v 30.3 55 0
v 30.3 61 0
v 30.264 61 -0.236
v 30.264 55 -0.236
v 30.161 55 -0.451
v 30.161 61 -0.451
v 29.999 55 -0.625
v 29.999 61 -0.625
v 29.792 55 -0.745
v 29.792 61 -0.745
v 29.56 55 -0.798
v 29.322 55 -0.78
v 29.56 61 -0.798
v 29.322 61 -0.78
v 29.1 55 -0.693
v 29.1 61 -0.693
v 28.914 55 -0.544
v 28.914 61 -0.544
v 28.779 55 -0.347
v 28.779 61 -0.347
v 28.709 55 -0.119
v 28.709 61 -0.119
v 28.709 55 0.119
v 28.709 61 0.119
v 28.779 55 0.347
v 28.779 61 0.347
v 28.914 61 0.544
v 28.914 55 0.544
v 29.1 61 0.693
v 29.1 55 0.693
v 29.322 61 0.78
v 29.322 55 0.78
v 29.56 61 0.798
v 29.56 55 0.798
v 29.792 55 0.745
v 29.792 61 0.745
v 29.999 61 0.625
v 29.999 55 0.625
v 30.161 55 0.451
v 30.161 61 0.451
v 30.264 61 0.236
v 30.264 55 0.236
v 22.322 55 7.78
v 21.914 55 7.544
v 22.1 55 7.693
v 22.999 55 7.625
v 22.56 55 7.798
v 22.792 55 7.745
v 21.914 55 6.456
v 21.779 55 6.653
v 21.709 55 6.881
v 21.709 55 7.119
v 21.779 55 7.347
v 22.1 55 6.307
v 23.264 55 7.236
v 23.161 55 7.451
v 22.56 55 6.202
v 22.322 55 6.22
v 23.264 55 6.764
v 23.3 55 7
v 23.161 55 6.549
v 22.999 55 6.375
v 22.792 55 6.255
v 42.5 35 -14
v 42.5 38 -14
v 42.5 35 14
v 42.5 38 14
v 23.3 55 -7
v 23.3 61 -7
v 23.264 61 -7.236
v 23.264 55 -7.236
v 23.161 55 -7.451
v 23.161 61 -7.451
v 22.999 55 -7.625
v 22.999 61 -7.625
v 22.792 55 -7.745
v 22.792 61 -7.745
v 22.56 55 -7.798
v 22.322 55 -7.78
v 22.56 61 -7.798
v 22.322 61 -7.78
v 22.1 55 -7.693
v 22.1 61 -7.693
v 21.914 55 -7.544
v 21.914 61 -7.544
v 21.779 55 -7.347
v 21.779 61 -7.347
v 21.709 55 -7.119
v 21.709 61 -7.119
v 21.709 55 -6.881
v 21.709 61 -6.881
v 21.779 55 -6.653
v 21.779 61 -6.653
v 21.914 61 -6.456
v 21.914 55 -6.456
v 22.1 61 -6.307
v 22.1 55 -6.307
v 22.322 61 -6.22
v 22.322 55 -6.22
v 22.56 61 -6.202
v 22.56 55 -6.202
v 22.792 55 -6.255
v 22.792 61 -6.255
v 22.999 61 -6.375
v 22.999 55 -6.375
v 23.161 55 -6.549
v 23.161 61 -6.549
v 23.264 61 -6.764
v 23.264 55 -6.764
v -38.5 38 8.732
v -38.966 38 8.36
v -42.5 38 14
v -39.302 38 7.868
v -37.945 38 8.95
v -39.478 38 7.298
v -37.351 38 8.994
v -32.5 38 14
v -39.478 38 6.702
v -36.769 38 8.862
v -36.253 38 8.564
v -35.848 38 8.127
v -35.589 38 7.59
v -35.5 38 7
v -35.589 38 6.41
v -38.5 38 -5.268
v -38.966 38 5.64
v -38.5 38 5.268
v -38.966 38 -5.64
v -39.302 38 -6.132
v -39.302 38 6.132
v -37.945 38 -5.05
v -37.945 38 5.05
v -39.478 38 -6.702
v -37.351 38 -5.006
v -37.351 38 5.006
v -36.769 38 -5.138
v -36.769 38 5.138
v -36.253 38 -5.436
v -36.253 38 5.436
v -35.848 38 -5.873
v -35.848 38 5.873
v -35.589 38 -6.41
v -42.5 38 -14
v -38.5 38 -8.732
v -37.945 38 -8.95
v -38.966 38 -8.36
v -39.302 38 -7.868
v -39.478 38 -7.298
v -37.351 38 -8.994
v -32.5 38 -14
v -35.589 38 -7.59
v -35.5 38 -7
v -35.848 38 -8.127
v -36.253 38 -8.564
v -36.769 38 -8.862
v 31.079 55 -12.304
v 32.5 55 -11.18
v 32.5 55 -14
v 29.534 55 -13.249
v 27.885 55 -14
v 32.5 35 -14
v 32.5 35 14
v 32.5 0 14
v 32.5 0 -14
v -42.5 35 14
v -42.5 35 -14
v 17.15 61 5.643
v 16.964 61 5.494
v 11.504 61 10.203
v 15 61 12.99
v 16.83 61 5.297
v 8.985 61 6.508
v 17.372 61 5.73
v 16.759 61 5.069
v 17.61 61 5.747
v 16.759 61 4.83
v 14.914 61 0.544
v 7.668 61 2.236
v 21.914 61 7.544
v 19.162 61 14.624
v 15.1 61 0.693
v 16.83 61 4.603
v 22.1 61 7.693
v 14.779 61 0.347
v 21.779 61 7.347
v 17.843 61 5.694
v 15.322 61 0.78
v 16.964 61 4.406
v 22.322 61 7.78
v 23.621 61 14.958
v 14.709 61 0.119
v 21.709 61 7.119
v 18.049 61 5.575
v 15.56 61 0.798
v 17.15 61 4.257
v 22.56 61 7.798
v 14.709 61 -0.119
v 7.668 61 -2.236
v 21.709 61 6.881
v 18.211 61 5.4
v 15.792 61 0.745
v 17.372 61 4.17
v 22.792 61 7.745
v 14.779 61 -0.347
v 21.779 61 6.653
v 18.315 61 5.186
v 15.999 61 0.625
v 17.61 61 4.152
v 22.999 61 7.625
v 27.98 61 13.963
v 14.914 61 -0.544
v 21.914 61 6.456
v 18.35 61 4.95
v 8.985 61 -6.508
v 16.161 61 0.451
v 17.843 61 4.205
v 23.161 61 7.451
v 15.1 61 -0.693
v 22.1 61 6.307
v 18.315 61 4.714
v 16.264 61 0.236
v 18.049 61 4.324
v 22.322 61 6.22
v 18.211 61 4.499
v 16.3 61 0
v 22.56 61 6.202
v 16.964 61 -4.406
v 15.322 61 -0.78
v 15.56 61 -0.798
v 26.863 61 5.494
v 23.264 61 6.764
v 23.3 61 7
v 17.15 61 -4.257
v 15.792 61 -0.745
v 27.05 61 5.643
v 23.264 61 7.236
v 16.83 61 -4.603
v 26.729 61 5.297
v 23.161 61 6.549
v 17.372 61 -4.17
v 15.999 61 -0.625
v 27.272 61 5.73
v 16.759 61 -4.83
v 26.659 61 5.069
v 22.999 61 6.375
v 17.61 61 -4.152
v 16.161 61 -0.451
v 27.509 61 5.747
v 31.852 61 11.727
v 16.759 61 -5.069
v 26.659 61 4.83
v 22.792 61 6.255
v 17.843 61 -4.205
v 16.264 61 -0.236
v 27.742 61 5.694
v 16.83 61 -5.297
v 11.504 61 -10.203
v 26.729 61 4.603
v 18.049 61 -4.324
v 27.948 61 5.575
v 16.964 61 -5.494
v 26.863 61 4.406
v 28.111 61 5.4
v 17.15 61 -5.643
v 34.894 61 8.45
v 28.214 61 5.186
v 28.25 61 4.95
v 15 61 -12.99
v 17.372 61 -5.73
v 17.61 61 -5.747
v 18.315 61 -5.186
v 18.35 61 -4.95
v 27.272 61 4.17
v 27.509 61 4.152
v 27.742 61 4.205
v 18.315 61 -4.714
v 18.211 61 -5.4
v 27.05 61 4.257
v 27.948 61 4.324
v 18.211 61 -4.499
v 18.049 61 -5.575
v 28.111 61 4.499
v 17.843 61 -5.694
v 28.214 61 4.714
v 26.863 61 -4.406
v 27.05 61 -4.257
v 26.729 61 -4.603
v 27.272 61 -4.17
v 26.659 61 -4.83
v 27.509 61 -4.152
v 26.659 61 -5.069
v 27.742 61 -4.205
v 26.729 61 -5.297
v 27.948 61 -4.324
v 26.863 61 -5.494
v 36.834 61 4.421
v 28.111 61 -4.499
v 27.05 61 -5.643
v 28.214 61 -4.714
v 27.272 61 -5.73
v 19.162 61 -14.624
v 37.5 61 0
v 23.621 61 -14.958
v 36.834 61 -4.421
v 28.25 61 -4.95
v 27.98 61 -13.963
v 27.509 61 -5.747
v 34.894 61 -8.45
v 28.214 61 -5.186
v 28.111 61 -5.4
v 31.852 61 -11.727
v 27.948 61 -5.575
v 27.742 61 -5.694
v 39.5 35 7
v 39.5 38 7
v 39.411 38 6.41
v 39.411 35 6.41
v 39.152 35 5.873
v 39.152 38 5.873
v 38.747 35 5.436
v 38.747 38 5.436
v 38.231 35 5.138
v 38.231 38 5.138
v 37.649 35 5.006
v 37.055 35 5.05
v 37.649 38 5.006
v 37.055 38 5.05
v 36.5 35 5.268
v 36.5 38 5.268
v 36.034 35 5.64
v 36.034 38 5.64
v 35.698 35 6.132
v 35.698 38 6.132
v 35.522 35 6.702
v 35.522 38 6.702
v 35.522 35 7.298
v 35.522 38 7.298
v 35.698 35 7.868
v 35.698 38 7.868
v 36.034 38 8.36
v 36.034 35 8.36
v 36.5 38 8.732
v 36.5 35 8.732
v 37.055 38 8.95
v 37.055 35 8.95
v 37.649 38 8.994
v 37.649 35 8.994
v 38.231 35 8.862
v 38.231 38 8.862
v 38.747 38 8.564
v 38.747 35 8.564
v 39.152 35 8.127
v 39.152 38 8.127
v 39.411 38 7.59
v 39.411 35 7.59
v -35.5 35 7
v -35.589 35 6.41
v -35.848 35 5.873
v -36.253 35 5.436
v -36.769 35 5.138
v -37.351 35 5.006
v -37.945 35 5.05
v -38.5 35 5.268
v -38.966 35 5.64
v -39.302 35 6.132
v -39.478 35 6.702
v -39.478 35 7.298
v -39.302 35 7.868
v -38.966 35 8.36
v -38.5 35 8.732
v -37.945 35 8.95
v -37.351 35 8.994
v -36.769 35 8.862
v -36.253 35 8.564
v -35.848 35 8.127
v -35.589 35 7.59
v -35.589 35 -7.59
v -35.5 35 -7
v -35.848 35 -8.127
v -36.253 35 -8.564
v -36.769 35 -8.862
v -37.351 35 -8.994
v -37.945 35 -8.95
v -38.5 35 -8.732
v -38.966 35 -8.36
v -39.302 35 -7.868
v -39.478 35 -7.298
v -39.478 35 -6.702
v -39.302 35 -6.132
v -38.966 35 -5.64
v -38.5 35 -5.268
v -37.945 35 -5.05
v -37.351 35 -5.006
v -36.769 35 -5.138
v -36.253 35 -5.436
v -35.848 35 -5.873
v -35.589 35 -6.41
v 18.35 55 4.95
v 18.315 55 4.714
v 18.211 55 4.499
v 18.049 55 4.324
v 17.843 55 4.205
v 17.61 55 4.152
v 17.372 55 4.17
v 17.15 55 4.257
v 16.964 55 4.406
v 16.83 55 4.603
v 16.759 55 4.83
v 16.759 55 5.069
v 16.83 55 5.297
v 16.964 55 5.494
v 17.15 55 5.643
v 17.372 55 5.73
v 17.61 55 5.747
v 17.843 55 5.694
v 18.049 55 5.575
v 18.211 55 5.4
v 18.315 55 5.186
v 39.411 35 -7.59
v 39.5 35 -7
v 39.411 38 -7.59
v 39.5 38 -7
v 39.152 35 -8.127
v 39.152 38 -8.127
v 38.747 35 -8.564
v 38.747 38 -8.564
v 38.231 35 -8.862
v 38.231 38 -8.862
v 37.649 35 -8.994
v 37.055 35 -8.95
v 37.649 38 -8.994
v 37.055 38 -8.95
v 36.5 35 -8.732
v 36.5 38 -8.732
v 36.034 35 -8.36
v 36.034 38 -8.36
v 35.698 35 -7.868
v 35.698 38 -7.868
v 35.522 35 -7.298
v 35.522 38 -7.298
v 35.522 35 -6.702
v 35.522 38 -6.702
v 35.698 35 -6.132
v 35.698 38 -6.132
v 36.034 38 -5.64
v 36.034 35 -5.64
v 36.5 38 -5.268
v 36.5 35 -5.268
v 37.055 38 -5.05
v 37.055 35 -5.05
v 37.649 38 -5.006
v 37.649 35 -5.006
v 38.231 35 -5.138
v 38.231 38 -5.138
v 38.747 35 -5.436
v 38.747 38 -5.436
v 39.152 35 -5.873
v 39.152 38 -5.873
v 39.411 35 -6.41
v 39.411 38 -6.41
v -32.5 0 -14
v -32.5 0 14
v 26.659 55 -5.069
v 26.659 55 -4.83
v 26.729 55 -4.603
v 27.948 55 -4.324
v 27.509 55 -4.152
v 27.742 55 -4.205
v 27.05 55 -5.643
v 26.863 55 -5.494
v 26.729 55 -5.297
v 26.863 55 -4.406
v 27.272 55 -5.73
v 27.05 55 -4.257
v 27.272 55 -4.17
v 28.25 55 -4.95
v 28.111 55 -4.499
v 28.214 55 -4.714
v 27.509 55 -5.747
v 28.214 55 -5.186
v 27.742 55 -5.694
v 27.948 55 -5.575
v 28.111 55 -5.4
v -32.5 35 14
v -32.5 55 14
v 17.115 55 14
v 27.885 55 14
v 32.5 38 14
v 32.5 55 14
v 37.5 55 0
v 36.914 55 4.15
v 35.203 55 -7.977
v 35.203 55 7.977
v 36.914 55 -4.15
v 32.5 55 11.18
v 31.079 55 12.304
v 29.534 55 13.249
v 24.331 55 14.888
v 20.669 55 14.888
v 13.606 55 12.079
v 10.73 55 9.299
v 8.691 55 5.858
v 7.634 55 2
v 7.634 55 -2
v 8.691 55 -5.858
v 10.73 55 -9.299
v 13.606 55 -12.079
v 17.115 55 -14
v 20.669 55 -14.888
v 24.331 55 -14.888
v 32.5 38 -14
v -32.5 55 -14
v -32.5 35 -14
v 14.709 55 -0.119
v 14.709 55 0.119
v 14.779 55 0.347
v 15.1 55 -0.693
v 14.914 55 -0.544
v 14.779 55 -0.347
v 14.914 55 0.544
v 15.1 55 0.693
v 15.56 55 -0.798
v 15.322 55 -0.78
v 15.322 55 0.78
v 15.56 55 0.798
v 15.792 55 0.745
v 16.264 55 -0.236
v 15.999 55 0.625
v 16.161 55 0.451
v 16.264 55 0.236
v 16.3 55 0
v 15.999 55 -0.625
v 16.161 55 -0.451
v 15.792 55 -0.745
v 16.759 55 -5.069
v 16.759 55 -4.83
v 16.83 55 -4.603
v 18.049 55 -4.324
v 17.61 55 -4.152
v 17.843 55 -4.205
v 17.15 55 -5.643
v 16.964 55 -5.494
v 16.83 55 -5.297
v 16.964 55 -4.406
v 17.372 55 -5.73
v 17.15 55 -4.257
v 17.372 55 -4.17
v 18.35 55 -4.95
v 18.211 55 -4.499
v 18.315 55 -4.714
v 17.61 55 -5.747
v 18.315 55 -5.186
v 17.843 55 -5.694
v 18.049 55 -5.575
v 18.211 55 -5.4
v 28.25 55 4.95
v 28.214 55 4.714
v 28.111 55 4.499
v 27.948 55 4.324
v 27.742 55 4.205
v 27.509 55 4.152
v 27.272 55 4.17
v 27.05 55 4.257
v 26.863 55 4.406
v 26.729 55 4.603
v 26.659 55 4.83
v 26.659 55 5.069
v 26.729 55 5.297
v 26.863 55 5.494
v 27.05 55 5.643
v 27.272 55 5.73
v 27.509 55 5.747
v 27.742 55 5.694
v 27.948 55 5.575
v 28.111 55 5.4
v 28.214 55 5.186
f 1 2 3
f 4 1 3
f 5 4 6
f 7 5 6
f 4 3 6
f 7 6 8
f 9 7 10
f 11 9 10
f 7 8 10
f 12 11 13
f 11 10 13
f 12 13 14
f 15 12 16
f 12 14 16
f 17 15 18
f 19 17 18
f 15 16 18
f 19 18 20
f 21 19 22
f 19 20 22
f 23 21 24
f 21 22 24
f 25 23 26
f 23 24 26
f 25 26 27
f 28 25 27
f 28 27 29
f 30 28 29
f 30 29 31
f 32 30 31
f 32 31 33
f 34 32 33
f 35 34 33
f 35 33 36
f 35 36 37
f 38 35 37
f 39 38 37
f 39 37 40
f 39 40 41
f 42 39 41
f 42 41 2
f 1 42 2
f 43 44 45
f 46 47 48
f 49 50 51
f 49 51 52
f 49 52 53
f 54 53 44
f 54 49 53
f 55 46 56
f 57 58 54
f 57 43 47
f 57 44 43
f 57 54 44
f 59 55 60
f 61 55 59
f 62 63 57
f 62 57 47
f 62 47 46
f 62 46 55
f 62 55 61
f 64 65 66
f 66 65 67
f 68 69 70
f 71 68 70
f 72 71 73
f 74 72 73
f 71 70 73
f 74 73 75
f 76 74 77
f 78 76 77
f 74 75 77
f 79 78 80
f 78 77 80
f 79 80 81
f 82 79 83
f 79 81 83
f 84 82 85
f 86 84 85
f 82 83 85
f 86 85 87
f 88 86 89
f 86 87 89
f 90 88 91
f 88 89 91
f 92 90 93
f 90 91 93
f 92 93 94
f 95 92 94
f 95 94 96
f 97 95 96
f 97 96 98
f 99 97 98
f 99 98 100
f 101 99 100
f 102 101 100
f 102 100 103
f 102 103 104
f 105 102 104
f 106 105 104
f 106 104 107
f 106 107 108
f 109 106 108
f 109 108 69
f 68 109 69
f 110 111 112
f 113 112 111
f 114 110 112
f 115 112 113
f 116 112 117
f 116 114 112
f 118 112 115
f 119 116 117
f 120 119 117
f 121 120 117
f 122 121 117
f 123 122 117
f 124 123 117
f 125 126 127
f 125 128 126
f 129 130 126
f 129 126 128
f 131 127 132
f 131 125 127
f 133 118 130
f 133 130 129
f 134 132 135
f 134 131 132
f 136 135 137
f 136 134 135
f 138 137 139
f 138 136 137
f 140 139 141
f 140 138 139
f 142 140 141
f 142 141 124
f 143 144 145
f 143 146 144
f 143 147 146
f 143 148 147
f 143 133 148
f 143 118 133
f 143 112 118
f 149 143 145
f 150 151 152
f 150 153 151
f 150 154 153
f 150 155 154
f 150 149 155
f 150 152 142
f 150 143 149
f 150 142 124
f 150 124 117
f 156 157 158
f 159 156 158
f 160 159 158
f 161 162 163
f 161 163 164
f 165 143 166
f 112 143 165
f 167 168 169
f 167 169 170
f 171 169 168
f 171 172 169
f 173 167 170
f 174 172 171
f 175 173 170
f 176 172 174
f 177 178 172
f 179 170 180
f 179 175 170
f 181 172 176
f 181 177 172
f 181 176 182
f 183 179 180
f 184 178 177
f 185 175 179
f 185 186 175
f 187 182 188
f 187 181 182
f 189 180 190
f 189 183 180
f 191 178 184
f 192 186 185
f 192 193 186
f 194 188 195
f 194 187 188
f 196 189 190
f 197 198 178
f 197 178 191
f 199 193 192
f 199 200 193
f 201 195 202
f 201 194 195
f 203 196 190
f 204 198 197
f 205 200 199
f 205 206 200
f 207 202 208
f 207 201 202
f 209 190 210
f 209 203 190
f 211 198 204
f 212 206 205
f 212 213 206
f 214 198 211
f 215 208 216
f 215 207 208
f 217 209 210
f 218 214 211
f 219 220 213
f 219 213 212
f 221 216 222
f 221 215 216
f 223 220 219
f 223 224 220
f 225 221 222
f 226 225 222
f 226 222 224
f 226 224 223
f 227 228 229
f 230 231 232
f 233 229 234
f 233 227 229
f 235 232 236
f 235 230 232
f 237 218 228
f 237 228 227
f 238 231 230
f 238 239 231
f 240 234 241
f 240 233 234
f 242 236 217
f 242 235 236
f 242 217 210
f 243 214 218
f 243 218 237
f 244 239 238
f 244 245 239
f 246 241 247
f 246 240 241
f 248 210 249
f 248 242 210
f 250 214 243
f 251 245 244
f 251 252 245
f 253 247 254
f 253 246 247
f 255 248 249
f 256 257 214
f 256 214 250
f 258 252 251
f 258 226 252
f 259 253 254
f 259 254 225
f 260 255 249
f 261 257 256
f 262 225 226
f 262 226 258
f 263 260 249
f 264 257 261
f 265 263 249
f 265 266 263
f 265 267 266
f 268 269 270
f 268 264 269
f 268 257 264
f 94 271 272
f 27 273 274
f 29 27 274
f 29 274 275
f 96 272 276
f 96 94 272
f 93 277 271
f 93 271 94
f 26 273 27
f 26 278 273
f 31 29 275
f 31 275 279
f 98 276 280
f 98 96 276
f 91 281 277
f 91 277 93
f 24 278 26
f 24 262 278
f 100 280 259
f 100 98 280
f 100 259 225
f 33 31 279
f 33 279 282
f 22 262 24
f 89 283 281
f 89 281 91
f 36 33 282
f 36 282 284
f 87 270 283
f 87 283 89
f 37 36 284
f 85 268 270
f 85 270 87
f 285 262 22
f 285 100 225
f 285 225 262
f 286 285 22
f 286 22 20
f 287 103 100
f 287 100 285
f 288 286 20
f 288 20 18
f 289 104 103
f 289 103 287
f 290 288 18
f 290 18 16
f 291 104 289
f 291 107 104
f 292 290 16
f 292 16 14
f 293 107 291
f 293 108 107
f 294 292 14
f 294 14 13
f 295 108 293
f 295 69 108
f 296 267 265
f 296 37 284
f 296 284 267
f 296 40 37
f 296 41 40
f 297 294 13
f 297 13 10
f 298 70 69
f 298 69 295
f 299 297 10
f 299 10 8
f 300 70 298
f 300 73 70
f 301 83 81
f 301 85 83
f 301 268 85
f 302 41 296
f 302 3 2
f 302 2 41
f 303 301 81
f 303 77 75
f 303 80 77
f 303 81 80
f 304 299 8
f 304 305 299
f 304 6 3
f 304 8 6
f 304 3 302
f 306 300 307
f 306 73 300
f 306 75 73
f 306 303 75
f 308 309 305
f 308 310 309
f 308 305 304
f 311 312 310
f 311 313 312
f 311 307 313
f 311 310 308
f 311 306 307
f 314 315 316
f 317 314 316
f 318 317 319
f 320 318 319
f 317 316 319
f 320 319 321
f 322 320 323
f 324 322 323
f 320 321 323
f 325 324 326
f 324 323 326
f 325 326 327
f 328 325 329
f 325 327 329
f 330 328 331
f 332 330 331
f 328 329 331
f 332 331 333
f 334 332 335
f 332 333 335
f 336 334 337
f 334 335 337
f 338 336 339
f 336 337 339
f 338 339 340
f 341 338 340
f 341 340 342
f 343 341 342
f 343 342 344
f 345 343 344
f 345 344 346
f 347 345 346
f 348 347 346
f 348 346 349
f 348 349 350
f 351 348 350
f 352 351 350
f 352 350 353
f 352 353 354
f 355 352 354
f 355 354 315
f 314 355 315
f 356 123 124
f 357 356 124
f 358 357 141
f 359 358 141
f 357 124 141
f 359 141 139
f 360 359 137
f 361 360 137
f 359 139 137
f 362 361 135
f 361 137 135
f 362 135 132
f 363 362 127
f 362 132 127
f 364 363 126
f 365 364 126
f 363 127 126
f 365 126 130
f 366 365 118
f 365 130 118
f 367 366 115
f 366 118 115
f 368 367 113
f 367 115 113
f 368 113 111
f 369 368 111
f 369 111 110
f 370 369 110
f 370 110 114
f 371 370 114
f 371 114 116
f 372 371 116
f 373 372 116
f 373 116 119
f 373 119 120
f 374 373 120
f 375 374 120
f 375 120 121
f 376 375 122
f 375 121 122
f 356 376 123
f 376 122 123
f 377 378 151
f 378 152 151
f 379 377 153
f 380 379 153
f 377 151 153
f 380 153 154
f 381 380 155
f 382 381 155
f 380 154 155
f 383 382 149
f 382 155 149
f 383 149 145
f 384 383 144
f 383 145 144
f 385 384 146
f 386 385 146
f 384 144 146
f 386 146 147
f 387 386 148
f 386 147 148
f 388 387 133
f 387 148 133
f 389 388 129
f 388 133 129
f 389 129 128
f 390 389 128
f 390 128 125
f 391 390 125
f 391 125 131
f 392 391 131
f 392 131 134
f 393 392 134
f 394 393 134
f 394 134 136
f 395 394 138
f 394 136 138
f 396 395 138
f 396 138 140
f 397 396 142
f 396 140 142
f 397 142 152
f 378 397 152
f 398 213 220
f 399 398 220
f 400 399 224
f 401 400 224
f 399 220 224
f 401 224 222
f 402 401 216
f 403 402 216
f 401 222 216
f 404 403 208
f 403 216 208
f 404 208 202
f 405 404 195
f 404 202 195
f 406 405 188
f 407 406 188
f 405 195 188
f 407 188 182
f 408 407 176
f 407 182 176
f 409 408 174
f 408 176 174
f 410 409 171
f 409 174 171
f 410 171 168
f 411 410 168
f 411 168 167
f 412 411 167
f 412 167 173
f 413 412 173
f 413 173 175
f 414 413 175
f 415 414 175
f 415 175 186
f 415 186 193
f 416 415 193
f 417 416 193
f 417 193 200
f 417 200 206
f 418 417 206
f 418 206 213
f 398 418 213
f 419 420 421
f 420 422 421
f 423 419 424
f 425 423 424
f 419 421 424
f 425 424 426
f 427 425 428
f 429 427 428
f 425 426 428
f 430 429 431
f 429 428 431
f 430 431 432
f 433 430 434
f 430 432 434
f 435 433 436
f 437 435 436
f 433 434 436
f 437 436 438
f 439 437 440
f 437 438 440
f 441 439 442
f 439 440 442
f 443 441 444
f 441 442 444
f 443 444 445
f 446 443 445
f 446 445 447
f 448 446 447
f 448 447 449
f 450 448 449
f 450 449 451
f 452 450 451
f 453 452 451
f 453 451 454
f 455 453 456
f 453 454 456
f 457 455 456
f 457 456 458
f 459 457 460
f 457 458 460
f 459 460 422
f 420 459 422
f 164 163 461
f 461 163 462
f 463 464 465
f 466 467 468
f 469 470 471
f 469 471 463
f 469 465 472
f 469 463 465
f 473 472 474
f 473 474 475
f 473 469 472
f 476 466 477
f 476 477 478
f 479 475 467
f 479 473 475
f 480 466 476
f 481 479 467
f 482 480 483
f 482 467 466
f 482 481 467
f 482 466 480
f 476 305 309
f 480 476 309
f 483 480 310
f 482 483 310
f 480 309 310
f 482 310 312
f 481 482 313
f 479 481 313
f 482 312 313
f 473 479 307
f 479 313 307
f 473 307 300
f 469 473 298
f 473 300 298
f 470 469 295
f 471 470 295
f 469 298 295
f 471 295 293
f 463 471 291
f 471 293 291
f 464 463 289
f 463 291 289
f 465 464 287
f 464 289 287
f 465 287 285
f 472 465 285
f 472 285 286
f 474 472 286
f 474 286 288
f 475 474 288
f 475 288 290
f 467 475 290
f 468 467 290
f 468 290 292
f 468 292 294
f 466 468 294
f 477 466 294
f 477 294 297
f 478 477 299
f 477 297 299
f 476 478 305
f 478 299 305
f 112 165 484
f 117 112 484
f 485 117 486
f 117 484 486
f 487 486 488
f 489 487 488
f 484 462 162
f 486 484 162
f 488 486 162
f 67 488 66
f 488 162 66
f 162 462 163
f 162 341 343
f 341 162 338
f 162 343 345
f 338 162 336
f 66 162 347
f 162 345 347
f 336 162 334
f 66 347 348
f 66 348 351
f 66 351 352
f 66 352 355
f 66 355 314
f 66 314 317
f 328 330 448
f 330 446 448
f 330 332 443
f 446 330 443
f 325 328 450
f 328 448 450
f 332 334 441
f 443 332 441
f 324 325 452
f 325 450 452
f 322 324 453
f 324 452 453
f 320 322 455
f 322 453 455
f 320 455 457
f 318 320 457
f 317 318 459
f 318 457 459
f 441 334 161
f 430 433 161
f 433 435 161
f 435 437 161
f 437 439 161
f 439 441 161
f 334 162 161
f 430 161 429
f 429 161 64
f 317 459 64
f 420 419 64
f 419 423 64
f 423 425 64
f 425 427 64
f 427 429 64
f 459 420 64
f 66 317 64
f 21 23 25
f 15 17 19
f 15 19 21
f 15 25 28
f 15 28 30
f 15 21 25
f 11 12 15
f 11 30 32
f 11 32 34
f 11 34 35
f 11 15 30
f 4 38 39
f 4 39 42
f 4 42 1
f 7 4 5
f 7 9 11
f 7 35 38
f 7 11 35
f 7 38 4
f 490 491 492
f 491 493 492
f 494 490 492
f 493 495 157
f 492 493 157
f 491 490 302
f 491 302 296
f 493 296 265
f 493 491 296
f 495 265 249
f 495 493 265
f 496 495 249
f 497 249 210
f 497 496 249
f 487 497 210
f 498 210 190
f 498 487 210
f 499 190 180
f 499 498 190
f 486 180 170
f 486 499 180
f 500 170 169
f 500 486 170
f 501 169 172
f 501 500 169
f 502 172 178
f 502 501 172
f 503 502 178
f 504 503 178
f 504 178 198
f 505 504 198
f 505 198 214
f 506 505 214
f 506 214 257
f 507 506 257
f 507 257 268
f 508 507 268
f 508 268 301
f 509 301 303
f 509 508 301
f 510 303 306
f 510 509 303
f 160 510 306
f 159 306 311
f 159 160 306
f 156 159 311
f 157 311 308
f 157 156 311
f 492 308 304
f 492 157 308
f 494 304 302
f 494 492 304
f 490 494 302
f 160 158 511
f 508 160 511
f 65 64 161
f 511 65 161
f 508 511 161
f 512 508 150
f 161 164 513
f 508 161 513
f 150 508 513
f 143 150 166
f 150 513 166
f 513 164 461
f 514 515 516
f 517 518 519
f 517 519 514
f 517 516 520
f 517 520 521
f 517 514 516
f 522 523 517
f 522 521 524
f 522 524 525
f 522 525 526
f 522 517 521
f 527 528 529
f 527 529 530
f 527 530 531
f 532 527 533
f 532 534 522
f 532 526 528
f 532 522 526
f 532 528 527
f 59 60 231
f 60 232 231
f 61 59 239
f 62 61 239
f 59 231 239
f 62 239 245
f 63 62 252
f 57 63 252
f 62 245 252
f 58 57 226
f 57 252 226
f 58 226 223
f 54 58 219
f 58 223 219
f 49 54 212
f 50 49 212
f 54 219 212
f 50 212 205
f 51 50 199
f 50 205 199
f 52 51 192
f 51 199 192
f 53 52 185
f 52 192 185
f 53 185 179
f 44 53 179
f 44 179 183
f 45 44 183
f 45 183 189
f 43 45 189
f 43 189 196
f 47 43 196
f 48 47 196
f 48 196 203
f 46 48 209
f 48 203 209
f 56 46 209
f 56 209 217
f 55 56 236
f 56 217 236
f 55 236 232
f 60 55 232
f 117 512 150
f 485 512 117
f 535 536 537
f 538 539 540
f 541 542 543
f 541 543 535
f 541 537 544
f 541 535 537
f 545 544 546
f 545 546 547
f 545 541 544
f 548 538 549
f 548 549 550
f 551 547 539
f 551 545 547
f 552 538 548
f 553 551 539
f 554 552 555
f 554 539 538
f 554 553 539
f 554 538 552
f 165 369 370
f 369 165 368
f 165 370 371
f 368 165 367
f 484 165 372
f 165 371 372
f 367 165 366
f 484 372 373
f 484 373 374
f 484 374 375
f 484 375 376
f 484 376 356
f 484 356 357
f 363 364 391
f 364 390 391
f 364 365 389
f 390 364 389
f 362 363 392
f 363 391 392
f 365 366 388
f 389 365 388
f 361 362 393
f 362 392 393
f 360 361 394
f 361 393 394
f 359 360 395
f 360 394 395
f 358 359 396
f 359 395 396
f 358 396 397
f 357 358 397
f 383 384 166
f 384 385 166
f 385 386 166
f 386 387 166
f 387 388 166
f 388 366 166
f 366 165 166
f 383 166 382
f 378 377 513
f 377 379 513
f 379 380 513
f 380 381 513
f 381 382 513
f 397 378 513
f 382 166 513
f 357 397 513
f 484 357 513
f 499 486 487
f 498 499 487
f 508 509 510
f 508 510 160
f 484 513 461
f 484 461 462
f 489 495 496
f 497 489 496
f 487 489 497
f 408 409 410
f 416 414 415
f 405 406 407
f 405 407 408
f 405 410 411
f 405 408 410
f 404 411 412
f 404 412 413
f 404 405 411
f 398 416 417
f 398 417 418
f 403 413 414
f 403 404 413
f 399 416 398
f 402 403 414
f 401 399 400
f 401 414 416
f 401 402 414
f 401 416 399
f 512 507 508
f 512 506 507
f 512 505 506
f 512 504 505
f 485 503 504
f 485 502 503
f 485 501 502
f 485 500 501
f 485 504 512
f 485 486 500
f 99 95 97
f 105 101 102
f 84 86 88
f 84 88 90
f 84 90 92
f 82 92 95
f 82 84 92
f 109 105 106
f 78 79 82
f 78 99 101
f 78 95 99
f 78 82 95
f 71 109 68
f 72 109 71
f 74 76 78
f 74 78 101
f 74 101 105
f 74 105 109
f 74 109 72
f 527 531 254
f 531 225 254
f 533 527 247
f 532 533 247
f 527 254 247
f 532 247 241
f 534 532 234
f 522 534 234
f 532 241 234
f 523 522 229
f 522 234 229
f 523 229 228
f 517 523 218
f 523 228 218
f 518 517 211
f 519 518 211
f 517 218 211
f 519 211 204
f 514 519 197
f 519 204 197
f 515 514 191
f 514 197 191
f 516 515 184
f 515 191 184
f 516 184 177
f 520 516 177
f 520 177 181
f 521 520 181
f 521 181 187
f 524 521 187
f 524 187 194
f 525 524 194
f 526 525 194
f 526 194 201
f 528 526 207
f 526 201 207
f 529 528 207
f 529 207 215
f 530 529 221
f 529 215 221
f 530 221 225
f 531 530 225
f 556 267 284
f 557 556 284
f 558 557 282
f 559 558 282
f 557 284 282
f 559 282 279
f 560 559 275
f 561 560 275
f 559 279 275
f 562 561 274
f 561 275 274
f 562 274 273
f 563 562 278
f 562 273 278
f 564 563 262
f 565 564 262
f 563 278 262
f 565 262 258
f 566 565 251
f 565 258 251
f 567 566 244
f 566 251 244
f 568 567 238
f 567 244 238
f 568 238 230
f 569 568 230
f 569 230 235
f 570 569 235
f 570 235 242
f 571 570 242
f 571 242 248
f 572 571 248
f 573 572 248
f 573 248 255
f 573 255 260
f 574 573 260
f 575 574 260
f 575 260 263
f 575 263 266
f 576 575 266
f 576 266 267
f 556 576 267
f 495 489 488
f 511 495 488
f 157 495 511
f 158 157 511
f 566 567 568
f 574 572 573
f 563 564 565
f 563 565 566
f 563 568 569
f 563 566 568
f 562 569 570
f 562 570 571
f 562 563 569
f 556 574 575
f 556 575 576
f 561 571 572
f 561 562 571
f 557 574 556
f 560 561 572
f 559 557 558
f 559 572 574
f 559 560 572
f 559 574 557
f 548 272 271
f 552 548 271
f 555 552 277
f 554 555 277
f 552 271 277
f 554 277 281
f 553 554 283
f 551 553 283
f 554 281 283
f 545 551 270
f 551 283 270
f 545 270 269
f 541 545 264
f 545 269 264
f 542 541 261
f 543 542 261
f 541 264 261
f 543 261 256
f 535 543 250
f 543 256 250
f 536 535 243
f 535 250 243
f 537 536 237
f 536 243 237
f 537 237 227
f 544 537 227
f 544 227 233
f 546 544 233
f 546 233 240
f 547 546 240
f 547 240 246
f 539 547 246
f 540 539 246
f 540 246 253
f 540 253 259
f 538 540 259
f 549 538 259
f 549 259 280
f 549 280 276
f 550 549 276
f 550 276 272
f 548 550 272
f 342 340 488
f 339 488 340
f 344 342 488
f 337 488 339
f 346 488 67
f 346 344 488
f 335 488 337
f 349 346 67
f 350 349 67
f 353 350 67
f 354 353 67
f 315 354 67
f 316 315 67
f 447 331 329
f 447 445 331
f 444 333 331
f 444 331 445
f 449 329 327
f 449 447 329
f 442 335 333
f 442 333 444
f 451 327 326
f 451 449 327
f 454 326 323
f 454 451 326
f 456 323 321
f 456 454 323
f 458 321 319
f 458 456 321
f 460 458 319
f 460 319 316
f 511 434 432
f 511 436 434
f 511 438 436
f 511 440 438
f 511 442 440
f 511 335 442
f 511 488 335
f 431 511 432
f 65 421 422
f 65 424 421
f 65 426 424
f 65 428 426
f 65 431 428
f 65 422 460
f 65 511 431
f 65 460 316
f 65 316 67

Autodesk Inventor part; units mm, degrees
ref_plane "YZ Plane" through (0, 0, 0) normal (1, 0, 0) x (0, 1, 0)
ref_plane "XZ Plane" through (0, 0, 0) normal (0, 1, 0) x (-1, 0, 0)
ref_plane "XY Plane" through (0, 0, 0) normal (0, 0, 1) x (1, 0, 0)
sketch "Sketch1" plane through (0, 0, 0) normal (0, 1, 0) x (-1, 0, 0)
  line L0 (32.5, 14) -> (19.5, 14)
  line L1 (-32.5, 14) -> (-32.5, -14)
  line L2 (-32.5, -14) -> (19.5, -14)
  line L3 (32.5, -14) -> (32.5, 14)
  line L4 (32.5, 14) -> (-32.5, -14) construction
  line L5 (-32.5, 14) -> (32.5, -14) construction
  line L6 (19.5, 14) -> (-32.5, 14)
  line L7 (19.5, -14) -> (32.5, -14)
  point P0 (0, 0)
  point P1 (32.5, 7.3274)
  point P2 (32.5, -11.3274)
  dimension "d0" = 65
  dimension "d1" = 28
extrude "Extrusion1" add sketch "Sketch1" along normal blind 55
sketch "Sketch2" plane through (0, 55, 0) normal (0, 1, 0) x (1, 0, 0)
  circle A0 centre (22.5, 0) radius 15
  line L0 (32.5, -14) -> (32.5, 14) projected
  line L1 (-32.5, -14) -> (32.5, -14) projected
  point P0 (0, 0)
  point P1 (-8.5, -16)
  dimension "d4" = 10
  dimension "d5" = 30
  dimension "d28" = 14
extrude "Extrusion2" add sketch "Sketch2" along normal blind 6 contours A0 L0 | L0 A0 L1 | L1 A0 picked at (24.6253, 2.0919)
sketch "Sketch3" plane through (22.5, 61, 0) normal (0, 1, 0) x (1, 0, 0)
  circle A0 centre (-7, 0) radius 0.8
  circle A1 centre (0, 0) radius 15 projected
  circle A2 centre (-4.9497, -4.9497) radius 0.8
  circle A3 centre (0, -7) radius 0.8
  circle A4 centre (4.9497, -4.9497) radius 0.8
  circle A5 centre (7, 0) radius 0.8
  circle A6 centre (4.9497, 4.9497) radius 0.8
  circle A7 centre (0, 7) radius 0.8
  circle A8 centre (-4.9497, 4.9497) radius 0.8
  point P0 (-22.5, 0)
  dimension "d12" = 1.6
  dimension "d14" = 7
  dimension "d17" = 360
extrude "Extrusion3" cut sketch "Sketch3" against normal up to surface (6 mm away) contours A0 | A2 | A3 | A4 | A5 | A6 | A7 | A8
sketch "Sketch4" plane through (0, 55, 0) normal (0, 1, 0) x (1, 0, 0)
  circle A0 centre (-37.5, -7) radius 2
  circle A1 centre (37.5, -7) radius 2
  circle A2 centre (37.5, 7) radius 2
  circle A3 centre (-37.5, 7) radius 2
  line L0 (-32.5, -14) -> (32.5, -14) projected
  line L1 (32.5, -14) -> (32.5, 14) projected
  line L2 (-32.5, 14) -> (-32.5, -14) projected
  line L3 (-32.5, 14) -> (-42.5, 14)
  line L4 (-42.5, 14) -> (-42.5, -14)
  line L5 (-42.5, -14) -> (-32.5, -14)
  line L6 (-32.5, -14) -> (-32.5, 14)
  line L7 (32.5, 14) -> (42.5, 14)
  line L8 (42.5, 14) -> (42.5, -14)
  line L9 (42.5, -14) -> (32.5, -14)
  line L10 (32.5, -14) -> (32.5, 14)
  point P0 (0, 0)
  point P1 (-8.5, -16)
  point P2 (29.5, -14)
  point P3 (32.5, -11)
  point P4 (32.5, 11)
  dimension "d21" = 4
  dimension "d22" = 14
  dimension "d23" = 7
  dimension "d29" = 5
  dimension "d30" = 5
  dimension "d31" = 5
  dimension "d32" = 5
extrude "Extrusion4" add sketch "Sketch4" against normal blind 20
sketch "Sketch5" plane through (0, 55, 0) normal (0, 1, 0) x (1, 0, 0)
  line L0 (42.5, 14) -> (-42.5, 14) projected
  line L1 (-32.5, 14) -> (-32.5, -14) projected
  line L2 (-42.5, 14) -> (-32.5, 14)
  line L3 (-32.5, 14) -> (-32.5, -14)
  line L4 (-32.5, -14) -> (-42.5, -14)
  line L5 (-42.5, -14) -> (-42.5, 14)
  line L6 (32.5, -14) -> (32.5, 14) projected
  line L7 (42.5, 14) -> (42.5, -14) projected
  line L8 (32.5, -14) -> (42.5, -14)
  line L9 (42.5, -14) -> (42.5, 14)
  line L10 (42.5, 14) -> (32.5, 14)
  line L11 (32.5, 14) -> (32.5, -14)
  point P0 (0, 0)
extrude "Extrusion5" cut sketch "Sketch5" against normal blind 17
equation "\"d30\" = d29"
equation "\"d31\" = d30"
equation "\"d32\" = d29"
properties part number "servo" material "Aluminum"
